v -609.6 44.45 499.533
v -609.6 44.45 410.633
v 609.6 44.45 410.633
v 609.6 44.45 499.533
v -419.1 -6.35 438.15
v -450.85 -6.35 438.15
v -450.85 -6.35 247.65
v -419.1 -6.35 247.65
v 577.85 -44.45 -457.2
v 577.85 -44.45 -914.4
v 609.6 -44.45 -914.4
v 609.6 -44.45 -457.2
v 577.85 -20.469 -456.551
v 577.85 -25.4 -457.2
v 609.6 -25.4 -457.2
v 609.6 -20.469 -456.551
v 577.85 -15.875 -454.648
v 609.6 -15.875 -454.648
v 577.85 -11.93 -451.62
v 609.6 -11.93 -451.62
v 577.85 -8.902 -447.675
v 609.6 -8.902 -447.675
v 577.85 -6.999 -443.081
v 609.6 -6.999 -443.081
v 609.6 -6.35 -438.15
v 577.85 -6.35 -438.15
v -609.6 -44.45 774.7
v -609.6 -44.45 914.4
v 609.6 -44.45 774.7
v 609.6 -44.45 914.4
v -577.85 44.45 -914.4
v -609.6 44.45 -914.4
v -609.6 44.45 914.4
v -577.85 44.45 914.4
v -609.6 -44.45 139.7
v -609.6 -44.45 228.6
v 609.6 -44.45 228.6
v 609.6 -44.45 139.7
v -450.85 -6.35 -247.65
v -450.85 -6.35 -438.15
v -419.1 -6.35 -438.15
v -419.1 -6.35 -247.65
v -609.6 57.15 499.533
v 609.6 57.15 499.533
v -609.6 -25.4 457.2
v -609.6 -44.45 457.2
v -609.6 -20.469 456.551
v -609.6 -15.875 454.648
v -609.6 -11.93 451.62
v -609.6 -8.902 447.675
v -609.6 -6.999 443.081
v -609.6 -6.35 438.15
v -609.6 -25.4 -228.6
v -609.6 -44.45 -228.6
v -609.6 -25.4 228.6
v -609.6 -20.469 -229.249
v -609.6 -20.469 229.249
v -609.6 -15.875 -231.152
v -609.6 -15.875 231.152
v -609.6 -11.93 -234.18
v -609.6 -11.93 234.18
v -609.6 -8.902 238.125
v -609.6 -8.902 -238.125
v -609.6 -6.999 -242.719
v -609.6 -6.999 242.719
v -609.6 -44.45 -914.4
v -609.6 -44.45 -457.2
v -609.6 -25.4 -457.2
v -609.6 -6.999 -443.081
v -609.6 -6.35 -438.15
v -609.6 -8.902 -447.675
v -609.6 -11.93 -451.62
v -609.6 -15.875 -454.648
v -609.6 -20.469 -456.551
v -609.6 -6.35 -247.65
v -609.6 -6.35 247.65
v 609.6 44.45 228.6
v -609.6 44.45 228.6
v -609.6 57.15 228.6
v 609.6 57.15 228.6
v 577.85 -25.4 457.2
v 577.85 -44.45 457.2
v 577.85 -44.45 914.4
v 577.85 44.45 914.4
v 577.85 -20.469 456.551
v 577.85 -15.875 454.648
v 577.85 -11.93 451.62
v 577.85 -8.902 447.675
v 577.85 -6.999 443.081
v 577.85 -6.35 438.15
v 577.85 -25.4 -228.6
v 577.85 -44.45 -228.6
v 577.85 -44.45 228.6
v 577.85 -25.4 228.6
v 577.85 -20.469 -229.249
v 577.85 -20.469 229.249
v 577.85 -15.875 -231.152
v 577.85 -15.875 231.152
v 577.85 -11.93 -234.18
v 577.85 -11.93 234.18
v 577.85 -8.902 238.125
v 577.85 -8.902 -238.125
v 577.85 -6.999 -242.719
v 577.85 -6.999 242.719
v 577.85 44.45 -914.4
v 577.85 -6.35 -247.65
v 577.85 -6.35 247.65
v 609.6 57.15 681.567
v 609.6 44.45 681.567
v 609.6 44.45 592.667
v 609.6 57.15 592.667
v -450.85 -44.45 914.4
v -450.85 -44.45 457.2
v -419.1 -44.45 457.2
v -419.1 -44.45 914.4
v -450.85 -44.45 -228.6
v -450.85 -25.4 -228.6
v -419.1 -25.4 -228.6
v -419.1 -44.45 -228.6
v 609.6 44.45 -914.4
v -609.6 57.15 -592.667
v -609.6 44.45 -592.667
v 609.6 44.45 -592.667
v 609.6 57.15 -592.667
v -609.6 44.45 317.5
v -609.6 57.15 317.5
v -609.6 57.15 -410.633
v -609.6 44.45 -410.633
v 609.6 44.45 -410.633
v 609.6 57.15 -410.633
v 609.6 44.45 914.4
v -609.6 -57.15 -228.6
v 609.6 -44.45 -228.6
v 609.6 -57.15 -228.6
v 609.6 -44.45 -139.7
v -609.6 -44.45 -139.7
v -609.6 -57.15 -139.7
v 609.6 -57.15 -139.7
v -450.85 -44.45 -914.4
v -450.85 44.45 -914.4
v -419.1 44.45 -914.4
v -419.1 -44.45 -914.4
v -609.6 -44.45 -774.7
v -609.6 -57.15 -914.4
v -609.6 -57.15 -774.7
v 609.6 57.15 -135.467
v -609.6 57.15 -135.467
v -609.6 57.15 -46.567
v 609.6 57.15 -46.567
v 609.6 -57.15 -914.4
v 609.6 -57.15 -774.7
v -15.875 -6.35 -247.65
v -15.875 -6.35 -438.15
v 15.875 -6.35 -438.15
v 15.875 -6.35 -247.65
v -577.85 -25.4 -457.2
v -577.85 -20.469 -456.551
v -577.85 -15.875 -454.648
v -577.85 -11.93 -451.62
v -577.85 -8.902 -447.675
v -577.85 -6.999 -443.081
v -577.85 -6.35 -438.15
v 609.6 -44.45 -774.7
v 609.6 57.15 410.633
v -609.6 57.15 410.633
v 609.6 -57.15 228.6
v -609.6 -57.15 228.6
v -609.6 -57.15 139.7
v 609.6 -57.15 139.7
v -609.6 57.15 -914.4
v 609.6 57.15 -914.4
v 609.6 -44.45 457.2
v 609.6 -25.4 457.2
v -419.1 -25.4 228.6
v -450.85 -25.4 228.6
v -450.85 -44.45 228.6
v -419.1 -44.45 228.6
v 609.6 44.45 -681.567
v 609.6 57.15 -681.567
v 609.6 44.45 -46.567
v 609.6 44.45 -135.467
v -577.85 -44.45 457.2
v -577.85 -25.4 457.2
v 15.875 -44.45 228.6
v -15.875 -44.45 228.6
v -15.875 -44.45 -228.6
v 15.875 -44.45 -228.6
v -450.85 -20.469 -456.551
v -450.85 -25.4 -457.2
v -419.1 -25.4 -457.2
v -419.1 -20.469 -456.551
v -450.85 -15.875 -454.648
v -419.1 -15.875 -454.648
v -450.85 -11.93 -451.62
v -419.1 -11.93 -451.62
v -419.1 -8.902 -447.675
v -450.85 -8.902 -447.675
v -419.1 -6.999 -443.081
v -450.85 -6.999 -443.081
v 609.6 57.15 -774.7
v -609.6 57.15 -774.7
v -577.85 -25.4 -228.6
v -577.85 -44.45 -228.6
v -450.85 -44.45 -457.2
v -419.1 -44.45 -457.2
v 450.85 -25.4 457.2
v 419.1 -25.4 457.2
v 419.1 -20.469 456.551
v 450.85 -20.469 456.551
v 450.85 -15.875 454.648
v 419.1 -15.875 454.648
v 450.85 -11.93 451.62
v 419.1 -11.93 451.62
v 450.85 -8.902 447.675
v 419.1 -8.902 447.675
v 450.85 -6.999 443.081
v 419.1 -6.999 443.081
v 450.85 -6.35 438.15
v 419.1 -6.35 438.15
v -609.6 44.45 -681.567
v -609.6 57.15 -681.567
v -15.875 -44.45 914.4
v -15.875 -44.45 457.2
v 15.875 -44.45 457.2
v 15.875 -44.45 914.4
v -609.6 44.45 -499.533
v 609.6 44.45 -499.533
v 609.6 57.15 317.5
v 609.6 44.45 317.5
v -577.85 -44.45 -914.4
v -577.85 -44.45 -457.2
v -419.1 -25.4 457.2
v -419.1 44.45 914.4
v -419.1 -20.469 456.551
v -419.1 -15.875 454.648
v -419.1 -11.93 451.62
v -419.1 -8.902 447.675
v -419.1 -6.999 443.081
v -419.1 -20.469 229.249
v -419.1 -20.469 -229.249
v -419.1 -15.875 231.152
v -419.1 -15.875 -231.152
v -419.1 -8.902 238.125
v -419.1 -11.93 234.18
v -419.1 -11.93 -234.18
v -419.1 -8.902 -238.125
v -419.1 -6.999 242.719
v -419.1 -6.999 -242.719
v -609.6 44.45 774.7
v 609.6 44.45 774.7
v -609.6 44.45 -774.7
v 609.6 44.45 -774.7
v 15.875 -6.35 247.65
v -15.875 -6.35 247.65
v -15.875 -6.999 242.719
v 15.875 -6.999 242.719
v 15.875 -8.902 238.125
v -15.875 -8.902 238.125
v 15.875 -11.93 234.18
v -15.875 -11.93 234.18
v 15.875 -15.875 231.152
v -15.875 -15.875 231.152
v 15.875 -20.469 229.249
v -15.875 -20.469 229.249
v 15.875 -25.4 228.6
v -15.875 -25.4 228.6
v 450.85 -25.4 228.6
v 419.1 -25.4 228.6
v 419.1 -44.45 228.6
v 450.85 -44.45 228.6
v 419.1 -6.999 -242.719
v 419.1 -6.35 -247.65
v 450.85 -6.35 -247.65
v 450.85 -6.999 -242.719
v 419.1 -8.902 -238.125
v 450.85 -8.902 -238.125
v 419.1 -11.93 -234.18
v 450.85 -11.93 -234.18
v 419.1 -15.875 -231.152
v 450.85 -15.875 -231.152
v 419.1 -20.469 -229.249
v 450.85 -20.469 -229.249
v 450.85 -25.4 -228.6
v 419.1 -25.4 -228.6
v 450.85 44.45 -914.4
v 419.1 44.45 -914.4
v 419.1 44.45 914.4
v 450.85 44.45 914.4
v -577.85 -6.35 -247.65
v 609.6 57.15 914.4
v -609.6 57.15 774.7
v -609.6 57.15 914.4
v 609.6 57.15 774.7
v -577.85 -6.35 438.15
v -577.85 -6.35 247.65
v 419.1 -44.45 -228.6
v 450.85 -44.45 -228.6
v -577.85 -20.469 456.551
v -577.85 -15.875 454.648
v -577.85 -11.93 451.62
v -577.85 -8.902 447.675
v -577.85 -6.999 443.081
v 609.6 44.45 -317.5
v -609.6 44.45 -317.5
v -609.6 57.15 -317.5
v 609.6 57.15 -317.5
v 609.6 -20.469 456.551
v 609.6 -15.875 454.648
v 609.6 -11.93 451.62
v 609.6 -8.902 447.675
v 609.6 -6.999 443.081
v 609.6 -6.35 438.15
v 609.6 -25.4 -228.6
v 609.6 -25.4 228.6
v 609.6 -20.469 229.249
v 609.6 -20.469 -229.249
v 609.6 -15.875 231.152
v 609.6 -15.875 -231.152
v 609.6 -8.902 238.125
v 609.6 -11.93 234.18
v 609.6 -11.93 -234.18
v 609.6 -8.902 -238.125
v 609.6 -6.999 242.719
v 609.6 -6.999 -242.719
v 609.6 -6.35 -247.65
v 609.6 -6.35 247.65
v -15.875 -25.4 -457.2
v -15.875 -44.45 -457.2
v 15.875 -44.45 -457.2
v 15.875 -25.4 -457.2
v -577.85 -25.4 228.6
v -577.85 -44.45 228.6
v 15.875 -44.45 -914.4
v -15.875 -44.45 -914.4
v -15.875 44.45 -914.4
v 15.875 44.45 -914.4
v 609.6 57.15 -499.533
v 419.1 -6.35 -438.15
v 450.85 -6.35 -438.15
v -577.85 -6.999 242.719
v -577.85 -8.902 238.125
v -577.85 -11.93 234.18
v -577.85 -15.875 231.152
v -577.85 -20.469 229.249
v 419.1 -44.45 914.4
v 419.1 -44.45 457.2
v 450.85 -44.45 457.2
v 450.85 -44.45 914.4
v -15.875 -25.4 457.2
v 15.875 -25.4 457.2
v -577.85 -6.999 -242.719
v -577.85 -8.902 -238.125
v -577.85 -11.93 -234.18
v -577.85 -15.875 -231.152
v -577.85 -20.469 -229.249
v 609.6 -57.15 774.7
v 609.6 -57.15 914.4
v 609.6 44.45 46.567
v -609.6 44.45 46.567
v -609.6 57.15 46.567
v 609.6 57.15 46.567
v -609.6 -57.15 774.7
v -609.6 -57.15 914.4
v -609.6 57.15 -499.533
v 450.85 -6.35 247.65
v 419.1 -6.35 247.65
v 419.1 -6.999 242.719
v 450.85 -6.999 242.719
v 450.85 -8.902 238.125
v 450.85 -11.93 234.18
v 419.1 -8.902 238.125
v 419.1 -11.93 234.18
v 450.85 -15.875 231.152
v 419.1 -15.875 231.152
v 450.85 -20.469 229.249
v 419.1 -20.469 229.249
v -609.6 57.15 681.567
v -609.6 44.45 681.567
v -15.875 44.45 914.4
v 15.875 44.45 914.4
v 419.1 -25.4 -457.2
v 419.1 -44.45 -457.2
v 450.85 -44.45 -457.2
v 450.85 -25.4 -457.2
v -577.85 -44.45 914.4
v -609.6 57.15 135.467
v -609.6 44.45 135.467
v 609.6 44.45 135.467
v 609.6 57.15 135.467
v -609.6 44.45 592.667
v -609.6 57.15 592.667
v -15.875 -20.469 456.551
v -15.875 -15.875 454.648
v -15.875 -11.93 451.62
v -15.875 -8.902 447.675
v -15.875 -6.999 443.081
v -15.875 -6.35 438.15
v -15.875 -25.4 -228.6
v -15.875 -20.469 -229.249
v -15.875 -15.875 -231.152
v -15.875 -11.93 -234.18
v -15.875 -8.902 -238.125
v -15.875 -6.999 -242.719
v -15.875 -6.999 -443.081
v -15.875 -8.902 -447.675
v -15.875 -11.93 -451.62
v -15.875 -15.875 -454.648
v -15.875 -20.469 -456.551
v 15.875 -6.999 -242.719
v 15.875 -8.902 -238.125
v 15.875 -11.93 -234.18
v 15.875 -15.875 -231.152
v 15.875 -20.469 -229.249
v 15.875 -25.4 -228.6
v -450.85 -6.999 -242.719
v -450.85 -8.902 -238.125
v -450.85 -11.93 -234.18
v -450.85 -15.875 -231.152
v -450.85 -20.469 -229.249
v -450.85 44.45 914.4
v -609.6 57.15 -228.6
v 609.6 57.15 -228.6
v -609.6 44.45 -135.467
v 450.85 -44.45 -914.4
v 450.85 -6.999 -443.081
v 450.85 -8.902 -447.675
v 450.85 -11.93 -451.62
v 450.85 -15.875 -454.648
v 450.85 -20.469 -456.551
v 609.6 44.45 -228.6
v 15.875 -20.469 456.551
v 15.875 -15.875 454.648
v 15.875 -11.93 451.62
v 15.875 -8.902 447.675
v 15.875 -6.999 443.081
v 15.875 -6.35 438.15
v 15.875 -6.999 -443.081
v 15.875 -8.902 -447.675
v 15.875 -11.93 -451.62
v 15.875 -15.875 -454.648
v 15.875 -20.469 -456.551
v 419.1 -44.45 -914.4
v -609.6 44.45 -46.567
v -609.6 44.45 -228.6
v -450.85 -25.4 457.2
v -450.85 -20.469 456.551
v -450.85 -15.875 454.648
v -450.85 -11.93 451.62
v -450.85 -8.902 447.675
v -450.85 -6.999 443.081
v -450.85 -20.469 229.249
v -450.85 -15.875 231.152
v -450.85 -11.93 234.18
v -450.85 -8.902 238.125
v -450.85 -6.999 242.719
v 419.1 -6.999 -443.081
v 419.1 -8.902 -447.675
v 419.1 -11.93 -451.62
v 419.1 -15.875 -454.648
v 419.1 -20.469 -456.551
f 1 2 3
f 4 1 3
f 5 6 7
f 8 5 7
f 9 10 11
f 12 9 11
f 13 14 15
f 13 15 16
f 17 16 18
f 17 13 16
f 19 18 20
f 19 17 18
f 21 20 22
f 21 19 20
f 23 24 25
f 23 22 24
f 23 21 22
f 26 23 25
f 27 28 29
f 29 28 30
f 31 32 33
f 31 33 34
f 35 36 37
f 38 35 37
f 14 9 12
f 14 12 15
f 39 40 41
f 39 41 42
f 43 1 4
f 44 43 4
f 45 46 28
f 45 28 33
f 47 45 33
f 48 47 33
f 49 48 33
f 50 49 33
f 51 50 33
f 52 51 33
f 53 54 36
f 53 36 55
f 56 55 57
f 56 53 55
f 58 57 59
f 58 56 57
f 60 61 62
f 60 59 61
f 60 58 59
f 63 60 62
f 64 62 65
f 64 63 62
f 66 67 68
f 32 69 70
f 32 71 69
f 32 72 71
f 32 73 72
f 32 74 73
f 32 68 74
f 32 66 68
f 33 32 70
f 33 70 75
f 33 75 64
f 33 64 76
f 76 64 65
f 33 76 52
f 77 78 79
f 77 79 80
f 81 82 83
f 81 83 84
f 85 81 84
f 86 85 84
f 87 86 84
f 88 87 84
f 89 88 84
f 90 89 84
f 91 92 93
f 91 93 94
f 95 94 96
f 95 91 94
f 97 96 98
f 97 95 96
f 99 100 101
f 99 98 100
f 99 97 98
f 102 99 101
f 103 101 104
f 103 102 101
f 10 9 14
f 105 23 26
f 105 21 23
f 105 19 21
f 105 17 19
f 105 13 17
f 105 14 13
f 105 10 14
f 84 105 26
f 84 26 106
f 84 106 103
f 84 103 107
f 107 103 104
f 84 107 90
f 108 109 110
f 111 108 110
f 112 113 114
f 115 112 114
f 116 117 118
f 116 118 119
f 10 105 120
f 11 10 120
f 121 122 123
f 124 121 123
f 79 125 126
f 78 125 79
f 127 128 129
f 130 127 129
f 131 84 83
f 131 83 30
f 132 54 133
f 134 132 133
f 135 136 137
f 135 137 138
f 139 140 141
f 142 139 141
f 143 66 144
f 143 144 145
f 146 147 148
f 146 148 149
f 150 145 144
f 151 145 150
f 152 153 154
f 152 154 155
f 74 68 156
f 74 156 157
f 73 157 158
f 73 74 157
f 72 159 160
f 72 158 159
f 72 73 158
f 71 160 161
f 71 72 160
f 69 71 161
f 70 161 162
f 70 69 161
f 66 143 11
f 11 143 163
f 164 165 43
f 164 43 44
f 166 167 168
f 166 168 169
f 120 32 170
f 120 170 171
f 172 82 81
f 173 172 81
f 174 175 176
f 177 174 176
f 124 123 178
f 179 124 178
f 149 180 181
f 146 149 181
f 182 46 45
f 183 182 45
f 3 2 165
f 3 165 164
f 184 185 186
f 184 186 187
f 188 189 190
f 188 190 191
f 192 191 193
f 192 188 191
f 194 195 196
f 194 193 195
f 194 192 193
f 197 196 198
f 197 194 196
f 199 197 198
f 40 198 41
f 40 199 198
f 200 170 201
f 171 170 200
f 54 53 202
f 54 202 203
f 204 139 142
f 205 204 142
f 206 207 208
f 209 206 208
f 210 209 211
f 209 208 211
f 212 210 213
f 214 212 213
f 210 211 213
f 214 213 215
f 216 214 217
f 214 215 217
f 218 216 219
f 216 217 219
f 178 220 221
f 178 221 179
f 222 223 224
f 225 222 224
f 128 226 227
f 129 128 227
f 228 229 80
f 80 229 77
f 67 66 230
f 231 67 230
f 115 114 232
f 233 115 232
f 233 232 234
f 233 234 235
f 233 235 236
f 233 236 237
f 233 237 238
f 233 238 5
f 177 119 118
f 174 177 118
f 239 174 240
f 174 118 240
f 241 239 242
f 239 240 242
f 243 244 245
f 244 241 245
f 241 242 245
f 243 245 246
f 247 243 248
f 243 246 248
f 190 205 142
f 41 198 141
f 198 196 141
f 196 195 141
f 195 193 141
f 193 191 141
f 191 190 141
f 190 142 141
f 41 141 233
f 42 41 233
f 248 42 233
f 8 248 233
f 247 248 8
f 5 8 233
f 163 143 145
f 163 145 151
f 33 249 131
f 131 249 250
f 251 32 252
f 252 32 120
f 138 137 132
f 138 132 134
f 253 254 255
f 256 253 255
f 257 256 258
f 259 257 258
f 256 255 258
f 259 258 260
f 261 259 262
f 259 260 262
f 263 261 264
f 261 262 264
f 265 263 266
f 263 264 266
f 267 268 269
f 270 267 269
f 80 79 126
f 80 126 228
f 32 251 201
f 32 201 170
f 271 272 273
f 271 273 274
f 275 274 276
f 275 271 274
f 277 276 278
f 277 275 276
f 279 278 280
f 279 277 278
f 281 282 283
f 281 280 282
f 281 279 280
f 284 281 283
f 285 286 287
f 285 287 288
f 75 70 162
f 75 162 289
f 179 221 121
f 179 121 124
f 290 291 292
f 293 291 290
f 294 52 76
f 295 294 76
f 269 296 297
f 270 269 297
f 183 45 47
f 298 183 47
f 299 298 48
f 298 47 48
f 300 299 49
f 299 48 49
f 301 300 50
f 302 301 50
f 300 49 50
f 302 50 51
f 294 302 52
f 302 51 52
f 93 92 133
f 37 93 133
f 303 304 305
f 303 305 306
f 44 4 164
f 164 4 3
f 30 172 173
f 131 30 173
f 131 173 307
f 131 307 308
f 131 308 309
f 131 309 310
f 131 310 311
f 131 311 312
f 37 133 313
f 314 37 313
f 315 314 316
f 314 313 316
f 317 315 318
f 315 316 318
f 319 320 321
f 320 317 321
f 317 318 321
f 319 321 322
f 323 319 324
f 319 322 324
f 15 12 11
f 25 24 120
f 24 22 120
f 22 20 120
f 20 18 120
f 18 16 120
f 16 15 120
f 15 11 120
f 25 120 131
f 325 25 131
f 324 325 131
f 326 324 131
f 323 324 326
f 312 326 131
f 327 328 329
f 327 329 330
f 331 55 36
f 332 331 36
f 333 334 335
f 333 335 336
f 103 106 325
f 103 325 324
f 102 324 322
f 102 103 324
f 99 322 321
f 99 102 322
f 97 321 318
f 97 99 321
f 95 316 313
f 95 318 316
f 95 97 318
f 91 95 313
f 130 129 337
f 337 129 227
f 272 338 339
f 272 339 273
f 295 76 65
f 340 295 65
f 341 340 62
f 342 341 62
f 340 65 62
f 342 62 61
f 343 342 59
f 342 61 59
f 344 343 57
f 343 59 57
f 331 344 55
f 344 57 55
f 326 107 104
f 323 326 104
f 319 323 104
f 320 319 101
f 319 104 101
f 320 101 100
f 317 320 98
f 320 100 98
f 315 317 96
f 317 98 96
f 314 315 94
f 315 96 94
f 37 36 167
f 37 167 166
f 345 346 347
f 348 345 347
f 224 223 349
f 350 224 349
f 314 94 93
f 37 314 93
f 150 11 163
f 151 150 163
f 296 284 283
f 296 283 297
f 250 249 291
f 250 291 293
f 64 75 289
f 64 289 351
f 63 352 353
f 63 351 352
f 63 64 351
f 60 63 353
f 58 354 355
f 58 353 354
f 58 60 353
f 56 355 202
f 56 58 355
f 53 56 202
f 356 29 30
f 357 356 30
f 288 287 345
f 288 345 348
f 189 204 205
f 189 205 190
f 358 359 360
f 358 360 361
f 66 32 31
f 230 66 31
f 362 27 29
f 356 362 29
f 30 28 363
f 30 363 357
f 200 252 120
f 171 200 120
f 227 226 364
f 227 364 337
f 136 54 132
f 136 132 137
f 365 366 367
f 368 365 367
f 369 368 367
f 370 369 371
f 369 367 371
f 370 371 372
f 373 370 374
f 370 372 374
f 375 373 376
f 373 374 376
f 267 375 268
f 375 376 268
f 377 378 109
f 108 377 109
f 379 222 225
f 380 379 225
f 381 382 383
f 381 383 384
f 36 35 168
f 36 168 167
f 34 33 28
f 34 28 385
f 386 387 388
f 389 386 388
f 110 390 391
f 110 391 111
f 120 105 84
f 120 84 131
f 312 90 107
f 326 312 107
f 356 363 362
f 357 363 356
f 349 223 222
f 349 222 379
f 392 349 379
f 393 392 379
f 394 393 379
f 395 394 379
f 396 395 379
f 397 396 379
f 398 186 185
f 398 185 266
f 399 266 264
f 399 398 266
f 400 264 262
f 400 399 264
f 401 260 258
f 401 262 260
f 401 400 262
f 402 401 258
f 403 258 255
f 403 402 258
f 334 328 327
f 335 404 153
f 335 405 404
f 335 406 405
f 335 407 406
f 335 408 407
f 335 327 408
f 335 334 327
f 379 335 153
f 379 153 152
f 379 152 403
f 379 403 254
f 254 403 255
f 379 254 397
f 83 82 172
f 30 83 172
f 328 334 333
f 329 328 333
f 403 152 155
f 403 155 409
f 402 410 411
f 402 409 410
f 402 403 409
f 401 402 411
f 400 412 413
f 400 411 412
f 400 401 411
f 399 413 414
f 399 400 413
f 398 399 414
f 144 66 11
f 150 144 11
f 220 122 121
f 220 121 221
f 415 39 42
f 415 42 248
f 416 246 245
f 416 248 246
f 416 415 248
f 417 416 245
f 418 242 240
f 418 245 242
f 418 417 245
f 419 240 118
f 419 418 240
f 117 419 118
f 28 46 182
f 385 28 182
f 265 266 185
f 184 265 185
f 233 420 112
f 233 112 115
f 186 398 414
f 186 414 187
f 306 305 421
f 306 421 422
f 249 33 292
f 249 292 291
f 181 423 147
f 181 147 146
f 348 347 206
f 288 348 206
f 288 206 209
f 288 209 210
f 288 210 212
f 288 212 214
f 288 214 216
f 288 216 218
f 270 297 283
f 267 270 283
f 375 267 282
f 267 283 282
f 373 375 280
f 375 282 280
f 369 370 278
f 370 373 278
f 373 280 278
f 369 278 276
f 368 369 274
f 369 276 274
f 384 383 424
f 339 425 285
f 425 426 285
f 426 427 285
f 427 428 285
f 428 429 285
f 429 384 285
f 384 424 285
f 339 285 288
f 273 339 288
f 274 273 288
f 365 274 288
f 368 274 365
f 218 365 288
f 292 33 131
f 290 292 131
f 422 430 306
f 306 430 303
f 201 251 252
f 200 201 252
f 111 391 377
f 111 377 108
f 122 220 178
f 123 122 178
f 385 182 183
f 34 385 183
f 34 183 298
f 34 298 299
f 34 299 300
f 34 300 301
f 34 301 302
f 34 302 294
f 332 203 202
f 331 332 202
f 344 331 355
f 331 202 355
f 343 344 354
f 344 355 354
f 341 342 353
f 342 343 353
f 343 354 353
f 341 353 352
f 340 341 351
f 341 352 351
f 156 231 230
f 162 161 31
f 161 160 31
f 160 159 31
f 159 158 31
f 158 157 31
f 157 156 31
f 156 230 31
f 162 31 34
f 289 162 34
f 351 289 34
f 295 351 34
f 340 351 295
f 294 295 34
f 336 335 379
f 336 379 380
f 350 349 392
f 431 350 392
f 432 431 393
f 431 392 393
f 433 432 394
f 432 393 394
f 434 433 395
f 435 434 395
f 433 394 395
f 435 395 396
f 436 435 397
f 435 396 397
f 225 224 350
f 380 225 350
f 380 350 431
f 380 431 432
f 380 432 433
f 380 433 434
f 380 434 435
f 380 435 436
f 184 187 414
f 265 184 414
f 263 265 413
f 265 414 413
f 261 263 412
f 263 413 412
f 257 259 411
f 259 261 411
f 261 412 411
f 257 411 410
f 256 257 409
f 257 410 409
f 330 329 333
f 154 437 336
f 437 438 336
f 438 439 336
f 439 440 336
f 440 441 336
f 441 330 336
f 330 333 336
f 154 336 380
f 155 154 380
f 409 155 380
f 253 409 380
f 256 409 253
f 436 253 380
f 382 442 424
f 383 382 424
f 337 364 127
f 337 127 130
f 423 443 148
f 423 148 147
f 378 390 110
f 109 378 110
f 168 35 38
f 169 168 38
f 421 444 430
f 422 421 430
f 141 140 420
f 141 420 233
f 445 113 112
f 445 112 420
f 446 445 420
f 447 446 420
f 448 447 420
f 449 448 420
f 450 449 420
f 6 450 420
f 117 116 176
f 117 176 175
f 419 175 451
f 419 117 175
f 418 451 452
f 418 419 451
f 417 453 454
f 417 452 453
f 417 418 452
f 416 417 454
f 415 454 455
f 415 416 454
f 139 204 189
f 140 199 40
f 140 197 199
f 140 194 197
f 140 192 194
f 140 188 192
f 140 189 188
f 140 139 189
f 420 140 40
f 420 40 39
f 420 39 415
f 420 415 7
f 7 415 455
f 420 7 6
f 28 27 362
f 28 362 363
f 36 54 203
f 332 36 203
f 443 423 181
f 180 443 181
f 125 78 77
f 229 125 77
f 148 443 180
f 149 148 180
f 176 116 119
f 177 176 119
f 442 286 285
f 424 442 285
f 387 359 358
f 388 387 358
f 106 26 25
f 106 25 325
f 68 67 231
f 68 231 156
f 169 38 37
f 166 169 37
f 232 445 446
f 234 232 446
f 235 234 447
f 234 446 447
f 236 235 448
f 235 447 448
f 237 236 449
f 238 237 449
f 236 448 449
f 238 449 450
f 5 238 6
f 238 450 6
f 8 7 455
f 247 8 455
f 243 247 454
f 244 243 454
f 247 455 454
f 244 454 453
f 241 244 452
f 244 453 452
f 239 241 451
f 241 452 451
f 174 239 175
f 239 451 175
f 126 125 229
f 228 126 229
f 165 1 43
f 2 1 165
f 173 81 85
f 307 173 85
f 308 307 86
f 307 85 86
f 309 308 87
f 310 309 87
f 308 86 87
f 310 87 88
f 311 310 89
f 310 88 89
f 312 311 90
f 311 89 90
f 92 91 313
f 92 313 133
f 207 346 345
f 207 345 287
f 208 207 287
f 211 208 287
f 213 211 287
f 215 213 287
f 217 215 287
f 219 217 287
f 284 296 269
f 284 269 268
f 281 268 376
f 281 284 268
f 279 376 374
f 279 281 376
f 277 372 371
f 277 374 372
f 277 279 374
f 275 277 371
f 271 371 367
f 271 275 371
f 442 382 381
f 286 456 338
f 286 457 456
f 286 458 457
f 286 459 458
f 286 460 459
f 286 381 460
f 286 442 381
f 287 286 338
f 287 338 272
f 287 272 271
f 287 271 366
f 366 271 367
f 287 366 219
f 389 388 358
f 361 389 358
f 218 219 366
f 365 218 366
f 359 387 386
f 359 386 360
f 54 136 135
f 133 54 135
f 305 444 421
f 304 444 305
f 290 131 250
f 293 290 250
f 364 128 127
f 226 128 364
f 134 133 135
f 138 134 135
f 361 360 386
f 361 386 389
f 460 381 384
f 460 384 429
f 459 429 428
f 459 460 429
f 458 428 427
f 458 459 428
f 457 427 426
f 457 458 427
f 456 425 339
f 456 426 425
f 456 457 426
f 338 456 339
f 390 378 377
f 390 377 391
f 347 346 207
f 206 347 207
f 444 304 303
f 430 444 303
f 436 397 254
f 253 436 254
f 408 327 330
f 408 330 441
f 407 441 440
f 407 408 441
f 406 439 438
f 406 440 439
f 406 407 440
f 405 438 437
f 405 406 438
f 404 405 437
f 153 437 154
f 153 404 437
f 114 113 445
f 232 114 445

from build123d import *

# Parameters (mm, degrees)
BOSS_EXTRUDE1_DEPTH        = 914.4
BOSS_EXTRUDE1_DEPTH_BACK   = 914.4
SKETCH3_W                  = 31.75
SKETCH3_H                  = 88.9
BOSS_EXTRUDE1_2_DEPTH      = 914.4
BOSS_EXTRUDE1_2_DEPTH_BACK = 914.4
BOSS_EXTRUDE1_3_DEPTH      = 914.4
BOSS_EXTRUDE1_3_DEPTH_BACK = 914.4
BOSS_EXTRUDE1_4_DEPTH      = 914.4
BOSS_EXTRUDE1_4_DEPTH_BACK = 914.4
BOSS_EXTRUDE1_5_DEPTH      = 914.4
BOSS_EXTRUDE1_5_DEPTH_BACK = 914.4
SKETCH4_W                  = 1219.2
SKETCH4_H                  = 139.7
BOSS_EXTRUDE2_DEPTH        = 12.7
BOSS_EXTRUDE2_2_DEPTH      = 12.7
SKETCH4_H_2                = 88.9
BOSS_EXTRUDE2_3_DEPTH      = 12.7
BOSS_EXTRUDE2_4_DEPTH      = 12.7
BOSS_EXTRUDE2_5_DEPTH      = 12.7
BOSS_EXTRUDE2_6_DEPTH      = 12.7
BOSS_EXTRUDE2_7_DEPTH      = 12.7
BOSS_EXTRUDE2_8_DEPTH      = 12.7
BOSS_EXTRUDE2_9_DEPTH      = 12.7
BOSS_EXTRUDE2_10_DEPTH     = 12.7
SKETCH5_W                  = 1219.2
SKETCH5_H                  = 139.7
BOSS_EXTRUDE3_DEPTH        = 12.7
BOSS_EXTRUDE3_2_DEPTH      = 12.7
SKETCH5_H_2                = 88.9
BOSS_EXTRUDE3_3_DEPTH      = 12.7
BOSS_EXTRUDE3_4_DEPTH      = 12.7
CUT_EXTRUDE2_DEPTH         = 1526.071186043
CUT_EXTRUDE2_DEPTH_BACK    = 1526.071186043


with BuildPart() as part:
    # Sketch3 → Boss-Extrude1 (new, two sides: drawn at the far end of the back side and taken through both)
    with BuildSketch(Plane.XY.offset(-BOSS_EXTRUDE1_DEPTH_BACK)):
        with Locations((-593.725, 0)):
            Rectangle(SKETCH3_W, SKETCH3_H)
    extrude(amount=BOSS_EXTRUDE1_DEPTH + BOSS_EXTRUDE1_DEPTH_BACK)


with BuildPart() as body_2:
    # Sketch3 → Boss-Extrude1 2 (new, two sides: drawn at the far end of the back side and taken through both)
    with BuildSketch(Plane.XY.offset(-BOSS_EXTRUDE1_2_DEPTH_BACK)):
        with Locations((434.975, 0)):
            Rectangle(SKETCH3_W, SKETCH3_H)
    extrude(amount=BOSS_EXTRUDE1_2_DEPTH + BOSS_EXTRUDE1_2_DEPTH_BACK)


with BuildPart() as body_3:
    # Sketch3 → Boss-Extrude1 3 (new, two sides: drawn at the far end of the back side and taken through both)
    with BuildSketch(Plane.XY.offset(-BOSS_EXTRUDE1_3_DEPTH_BACK)):
        with Locations((593.725, 0)):
            Rectangle(SKETCH3_W, SKETCH3_H)
    extrude(amount=BOSS_EXTRUDE1_3_DEPTH + BOSS_EXTRUDE1_3_DEPTH_BACK)


with BuildPart() as body_4:
    # Sketch3 → Boss-Extrude1 4 (new, two sides: drawn at the far end of the back side and taken through both)
    with BuildSketch(Plane.XY.offset(-BOSS_EXTRUDE1_4_DEPTH_BACK)):
        with Locations((-434.975, 0)):
            Rectangle(SKETCH3_W, SKETCH3_H)
    extrude(amount=BOSS_EXTRUDE1_4_DEPTH + BOSS_EXTRUDE1_4_DEPTH_BACK)


with BuildPart() as body_5:
    # Sketch3 → Boss-Extrude1 5 (new, two sides: drawn at the far end of the back side and taken through both)
    with BuildSketch(Plane.XY.offset(-BOSS_EXTRUDE1_5_DEPTH_BACK)):
        Rectangle(SKETCH3_W, SKETCH3_H)
    extrude(amount=BOSS_EXTRUDE1_5_DEPTH + BOSS_EXTRUDE1_5_DEPTH_BACK)


with BuildPart() as body_6:
    # Sketch4 → Boss-Extrude2 (new body)
    with BuildSketch(Plane(origin=(0, 44.45, 0), x_dir=(1, 0, 0), z_dir=(0, 1, 0))):
        with Locations((0, -844.55)):
            Rectangle(SKETCH4_W, SKETCH4_H)
    extrude(amount=BOSS_EXTRUDE2_DEPTH)


with BuildPart() as body_7:
    # Sketch4 → Boss-Extrude2 2 (new body)
    with BuildSketch(Plane(origin=(0, 44.45, 0), x_dir=(1, 0, 0), z_dir=(0, 1, 0))):
        with Locations((0, 844.55)):
            Rectangle(SKETCH4_W, SKETCH4_H)
    extrude(amount=BOSS_EXTRUDE2_2_DEPTH)


with BuildPart() as body_8:
    # Sketch4 → Boss-Extrude2 3 (new body)
    with BuildSketch(Plane(origin=(0, 44.45, 0), x_dir=(1, 0, 0), z_dir=(0, 1, 0))):
        with Locations((0, -637.116666667)):
            Rectangle(SKETCH4_W, SKETCH4_H_2)
    extrude(amount=BOSS_EXTRUDE2_3_DEPTH)


with BuildPart() as body_9:
    # Sketch4 → Boss-Extrude2 4 (new body)
    with BuildSketch(Plane(origin=(0, 44.45, 0), x_dir=(1, 0, 0), z_dir=(0, 1, 0))):
        with Locations((0, -455.083333333)):
            Rectangle(SKETCH4_W, SKETCH4_H_2)
    extrude(amount=BOSS_EXTRUDE2_4_DEPTH)


with BuildPart() as body_10:
    # Sketch4 → Boss-Extrude2 5 (new body)
    with BuildSketch(Plane(origin=(0, 44.45, 0), x_dir=(1, 0, 0), z_dir=(0, 1, 0))):
        with Locations((0, 637.116666667)):
            Rectangle(SKETCH4_W, SKETCH4_H_2)
    extrude(amount=BOSS_EXTRUDE2_5_DEPTH)


with BuildPart() as body_11:
    # Sketch4 → Boss-Extrude2 6 (new body)
    with BuildSketch(Plane(origin=(0, 44.45, 0), x_dir=(1, 0, 0), z_dir=(0, 1, 0))):
        with Locations((0, -91.016666667)):
            Rectangle(SKETCH4_W, SKETCH4_H_2)
    extrude(amount=BOSS_EXTRUDE2_6_DEPTH)


with BuildPart() as body_12:
    # Sketch4 → Boss-Extrude2 7 (new body)
    with BuildSketch(Plane(origin=(0, 44.45, 0), x_dir=(1, 0, 0), z_dir=(0, 1, 0))):
        with Locations((0, -273.05)):
            Rectangle(SKETCH4_W, SKETCH4_H_2)
    extrude(amount=BOSS_EXTRUDE2_7_DEPTH)


with BuildPart() as body_13:
    # Sketch4 → Boss-Extrude2 8 (new body)
    with BuildSketch(Plane(origin=(0, 44.45, 0), x_dir=(1, 0, 0), z_dir=(0, 1, 0))):
        with Locations((0, 455.083333333)):
            Rectangle(SKETCH4_W, SKETCH4_H_2)
    extrude(amount=BOSS_EXTRUDE2_8_DEPTH)


with BuildPart() as body_14:
    # Sketch4 → Boss-Extrude2 9 (new body)
    with BuildSketch(Plane(origin=(0, 44.45, 0), x_dir=(1, 0, 0), z_dir=(0, 1, 0))):
        with Locations((0, 273.05)):
            Rectangle(SKETCH4_W, SKETCH4_H_2)
    extrude(amount=BOSS_EXTRUDE2_9_DEPTH)


with BuildPart() as body_15:
    # Sketch4 → Boss-Extrude2 10 (new body)
    with BuildSketch(Plane(origin=(0, 44.45, 0), x_dir=(1, 0, 0), z_dir=(0, 1, 0))):
        with Locations((0, 91.016666667)):
            Rectangle(SKETCH4_W, SKETCH4_H_2)
    extrude(amount=BOSS_EXTRUDE2_10_DEPTH)


with BuildPart() as body_16:
    # Sketch5 → Boss-Extrude3 (new body)
    with BuildSketch(Plane.XZ.offset(44.45)):
        with Locations((0, 844.55)):
            Rectangle(SKETCH5_W, SKETCH5_H)
    extrude(amount=BOSS_EXTRUDE3_DEPTH)


with BuildPart() as body_17:
    # Sketch5 → Boss-Extrude3 2 (new body)
    with BuildSketch(Plane.XZ.offset(44.45)):
        with Locations((0, -844.55)):
            Rectangle(SKETCH5_W, SKETCH5_H)
    extrude(amount=BOSS_EXTRUDE3_2_DEPTH)


with BuildPart() as body_18:
    # Sketch5 → Boss-Extrude3 3 (new body)
    with BuildSketch(Plane.XZ.offset(44.45)):
        with Locations((0, 184.15)):
            Rectangle(SKETCH5_W, SKETCH5_H_2)
    extrude(amount=BOSS_EXTRUDE3_3_DEPTH)


with BuildPart() as body_19:
    # Sketch5 → Boss-Extrude3 4 (new body)
    with BuildSketch(Plane.XZ.offset(44.45)):
        with Locations((0, -184.15)):
            Rectangle(SKETCH5_W, SKETCH5_H_2)
    extrude(amount=BOSS_EXTRUDE3_4_DEPTH)


with BuildPart() as cut_extrude2_tool:
    # Sketch8 → Cut-Extrude2 (new, two sides: drawn at the far end of the back side and taken through both)
    with BuildSketch(Plane(origin=(609.6, 0, 0), x_dir=(0, 0, -1), z_dir=(1, 0, 0)).offset(-CUT_EXTRUDE2_DEPTH_BACK)):
        with BuildLine():
            Line((-228.6, -44.45), (-457.2, -44.45))
            Line((-457.2, -44.45), (-457.2, -25.4))
            ThreePointArc((-457.2, -25.4), (-451.620384182, -11.929615818), (-438.15, -6.35))
            Line((-438.15, -6.35), (-247.65, -6.35))
            ThreePointArc((-247.65, -6.35), (-234.179615818, -11.929615818), (-228.6, -25.4))
            Line((-228.6, -25.4), (-228.6, -44.45))
        make_face()
        with BuildLine():
            Line((228.6, -44.45), (457.2, -44.45))
            Line((457.2, -44.45), (457.2, -25.4))
            ThreePointArc((457.2, -25.4), (451.620384182, -11.929615818), (438.15, -6.35))
            Line((438.15, -6.35), (247.65, -6.35))
            ThreePointArc((247.65, -6.35), (234.179615818, -11.929615818), (228.6, -25.4))
            Line((228.6, -25.4), (228.6, -44.45))
        make_face()
    extrude(amount=CUT_EXTRUDE2_DEPTH + CUT_EXTRUDE2_DEPTH_BACK)


with BuildPart() as part_1:
    add(part.part)

    # Cut-Extrude2: cut by cut_extrude2_tool
    add(cut_extrude2_tool.part, mode=Mode.SUBTRACT)


with BuildPart() as body_2_1:
    add(body_2.part)

    # Cut-Extrude2: cut by cut_extrude2_tool
    add(cut_extrude2_tool.part, mode=Mode.SUBTRACT)


with BuildPart() as body_3_1:
    add(body_3.part)

    # Cut-Extrude2: cut by cut_extrude2_tool
    add(cut_extrude2_tool.part, mode=Mode.SUBTRACT)


with BuildPart() as body_4_1:
    add(body_4.part)

    # Cut-Extrude2: cut by cut_extrude2_tool
    add(cut_extrude2_tool.part, mode=Mode.SUBTRACT)


with BuildPart() as body_5_1:
    add(body_5.part)

    # Cut-Extrude2: cut by cut_extrude2_tool
    add(cut_extrude2_tool.part, mode=Mode.SUBTRACT)


solid = Compound([body_6.part, body_7.part, body_8.part, body_9.part, body_10.part, body_11.part, body_12.part, body_13.part, body_14.part, body_15.part, body_16.part, body_17.part, body_18.part, body_19.part, part_1.part, body_2_1.part, body_3_1.part, body_4_1.part, body_5_1.part])
